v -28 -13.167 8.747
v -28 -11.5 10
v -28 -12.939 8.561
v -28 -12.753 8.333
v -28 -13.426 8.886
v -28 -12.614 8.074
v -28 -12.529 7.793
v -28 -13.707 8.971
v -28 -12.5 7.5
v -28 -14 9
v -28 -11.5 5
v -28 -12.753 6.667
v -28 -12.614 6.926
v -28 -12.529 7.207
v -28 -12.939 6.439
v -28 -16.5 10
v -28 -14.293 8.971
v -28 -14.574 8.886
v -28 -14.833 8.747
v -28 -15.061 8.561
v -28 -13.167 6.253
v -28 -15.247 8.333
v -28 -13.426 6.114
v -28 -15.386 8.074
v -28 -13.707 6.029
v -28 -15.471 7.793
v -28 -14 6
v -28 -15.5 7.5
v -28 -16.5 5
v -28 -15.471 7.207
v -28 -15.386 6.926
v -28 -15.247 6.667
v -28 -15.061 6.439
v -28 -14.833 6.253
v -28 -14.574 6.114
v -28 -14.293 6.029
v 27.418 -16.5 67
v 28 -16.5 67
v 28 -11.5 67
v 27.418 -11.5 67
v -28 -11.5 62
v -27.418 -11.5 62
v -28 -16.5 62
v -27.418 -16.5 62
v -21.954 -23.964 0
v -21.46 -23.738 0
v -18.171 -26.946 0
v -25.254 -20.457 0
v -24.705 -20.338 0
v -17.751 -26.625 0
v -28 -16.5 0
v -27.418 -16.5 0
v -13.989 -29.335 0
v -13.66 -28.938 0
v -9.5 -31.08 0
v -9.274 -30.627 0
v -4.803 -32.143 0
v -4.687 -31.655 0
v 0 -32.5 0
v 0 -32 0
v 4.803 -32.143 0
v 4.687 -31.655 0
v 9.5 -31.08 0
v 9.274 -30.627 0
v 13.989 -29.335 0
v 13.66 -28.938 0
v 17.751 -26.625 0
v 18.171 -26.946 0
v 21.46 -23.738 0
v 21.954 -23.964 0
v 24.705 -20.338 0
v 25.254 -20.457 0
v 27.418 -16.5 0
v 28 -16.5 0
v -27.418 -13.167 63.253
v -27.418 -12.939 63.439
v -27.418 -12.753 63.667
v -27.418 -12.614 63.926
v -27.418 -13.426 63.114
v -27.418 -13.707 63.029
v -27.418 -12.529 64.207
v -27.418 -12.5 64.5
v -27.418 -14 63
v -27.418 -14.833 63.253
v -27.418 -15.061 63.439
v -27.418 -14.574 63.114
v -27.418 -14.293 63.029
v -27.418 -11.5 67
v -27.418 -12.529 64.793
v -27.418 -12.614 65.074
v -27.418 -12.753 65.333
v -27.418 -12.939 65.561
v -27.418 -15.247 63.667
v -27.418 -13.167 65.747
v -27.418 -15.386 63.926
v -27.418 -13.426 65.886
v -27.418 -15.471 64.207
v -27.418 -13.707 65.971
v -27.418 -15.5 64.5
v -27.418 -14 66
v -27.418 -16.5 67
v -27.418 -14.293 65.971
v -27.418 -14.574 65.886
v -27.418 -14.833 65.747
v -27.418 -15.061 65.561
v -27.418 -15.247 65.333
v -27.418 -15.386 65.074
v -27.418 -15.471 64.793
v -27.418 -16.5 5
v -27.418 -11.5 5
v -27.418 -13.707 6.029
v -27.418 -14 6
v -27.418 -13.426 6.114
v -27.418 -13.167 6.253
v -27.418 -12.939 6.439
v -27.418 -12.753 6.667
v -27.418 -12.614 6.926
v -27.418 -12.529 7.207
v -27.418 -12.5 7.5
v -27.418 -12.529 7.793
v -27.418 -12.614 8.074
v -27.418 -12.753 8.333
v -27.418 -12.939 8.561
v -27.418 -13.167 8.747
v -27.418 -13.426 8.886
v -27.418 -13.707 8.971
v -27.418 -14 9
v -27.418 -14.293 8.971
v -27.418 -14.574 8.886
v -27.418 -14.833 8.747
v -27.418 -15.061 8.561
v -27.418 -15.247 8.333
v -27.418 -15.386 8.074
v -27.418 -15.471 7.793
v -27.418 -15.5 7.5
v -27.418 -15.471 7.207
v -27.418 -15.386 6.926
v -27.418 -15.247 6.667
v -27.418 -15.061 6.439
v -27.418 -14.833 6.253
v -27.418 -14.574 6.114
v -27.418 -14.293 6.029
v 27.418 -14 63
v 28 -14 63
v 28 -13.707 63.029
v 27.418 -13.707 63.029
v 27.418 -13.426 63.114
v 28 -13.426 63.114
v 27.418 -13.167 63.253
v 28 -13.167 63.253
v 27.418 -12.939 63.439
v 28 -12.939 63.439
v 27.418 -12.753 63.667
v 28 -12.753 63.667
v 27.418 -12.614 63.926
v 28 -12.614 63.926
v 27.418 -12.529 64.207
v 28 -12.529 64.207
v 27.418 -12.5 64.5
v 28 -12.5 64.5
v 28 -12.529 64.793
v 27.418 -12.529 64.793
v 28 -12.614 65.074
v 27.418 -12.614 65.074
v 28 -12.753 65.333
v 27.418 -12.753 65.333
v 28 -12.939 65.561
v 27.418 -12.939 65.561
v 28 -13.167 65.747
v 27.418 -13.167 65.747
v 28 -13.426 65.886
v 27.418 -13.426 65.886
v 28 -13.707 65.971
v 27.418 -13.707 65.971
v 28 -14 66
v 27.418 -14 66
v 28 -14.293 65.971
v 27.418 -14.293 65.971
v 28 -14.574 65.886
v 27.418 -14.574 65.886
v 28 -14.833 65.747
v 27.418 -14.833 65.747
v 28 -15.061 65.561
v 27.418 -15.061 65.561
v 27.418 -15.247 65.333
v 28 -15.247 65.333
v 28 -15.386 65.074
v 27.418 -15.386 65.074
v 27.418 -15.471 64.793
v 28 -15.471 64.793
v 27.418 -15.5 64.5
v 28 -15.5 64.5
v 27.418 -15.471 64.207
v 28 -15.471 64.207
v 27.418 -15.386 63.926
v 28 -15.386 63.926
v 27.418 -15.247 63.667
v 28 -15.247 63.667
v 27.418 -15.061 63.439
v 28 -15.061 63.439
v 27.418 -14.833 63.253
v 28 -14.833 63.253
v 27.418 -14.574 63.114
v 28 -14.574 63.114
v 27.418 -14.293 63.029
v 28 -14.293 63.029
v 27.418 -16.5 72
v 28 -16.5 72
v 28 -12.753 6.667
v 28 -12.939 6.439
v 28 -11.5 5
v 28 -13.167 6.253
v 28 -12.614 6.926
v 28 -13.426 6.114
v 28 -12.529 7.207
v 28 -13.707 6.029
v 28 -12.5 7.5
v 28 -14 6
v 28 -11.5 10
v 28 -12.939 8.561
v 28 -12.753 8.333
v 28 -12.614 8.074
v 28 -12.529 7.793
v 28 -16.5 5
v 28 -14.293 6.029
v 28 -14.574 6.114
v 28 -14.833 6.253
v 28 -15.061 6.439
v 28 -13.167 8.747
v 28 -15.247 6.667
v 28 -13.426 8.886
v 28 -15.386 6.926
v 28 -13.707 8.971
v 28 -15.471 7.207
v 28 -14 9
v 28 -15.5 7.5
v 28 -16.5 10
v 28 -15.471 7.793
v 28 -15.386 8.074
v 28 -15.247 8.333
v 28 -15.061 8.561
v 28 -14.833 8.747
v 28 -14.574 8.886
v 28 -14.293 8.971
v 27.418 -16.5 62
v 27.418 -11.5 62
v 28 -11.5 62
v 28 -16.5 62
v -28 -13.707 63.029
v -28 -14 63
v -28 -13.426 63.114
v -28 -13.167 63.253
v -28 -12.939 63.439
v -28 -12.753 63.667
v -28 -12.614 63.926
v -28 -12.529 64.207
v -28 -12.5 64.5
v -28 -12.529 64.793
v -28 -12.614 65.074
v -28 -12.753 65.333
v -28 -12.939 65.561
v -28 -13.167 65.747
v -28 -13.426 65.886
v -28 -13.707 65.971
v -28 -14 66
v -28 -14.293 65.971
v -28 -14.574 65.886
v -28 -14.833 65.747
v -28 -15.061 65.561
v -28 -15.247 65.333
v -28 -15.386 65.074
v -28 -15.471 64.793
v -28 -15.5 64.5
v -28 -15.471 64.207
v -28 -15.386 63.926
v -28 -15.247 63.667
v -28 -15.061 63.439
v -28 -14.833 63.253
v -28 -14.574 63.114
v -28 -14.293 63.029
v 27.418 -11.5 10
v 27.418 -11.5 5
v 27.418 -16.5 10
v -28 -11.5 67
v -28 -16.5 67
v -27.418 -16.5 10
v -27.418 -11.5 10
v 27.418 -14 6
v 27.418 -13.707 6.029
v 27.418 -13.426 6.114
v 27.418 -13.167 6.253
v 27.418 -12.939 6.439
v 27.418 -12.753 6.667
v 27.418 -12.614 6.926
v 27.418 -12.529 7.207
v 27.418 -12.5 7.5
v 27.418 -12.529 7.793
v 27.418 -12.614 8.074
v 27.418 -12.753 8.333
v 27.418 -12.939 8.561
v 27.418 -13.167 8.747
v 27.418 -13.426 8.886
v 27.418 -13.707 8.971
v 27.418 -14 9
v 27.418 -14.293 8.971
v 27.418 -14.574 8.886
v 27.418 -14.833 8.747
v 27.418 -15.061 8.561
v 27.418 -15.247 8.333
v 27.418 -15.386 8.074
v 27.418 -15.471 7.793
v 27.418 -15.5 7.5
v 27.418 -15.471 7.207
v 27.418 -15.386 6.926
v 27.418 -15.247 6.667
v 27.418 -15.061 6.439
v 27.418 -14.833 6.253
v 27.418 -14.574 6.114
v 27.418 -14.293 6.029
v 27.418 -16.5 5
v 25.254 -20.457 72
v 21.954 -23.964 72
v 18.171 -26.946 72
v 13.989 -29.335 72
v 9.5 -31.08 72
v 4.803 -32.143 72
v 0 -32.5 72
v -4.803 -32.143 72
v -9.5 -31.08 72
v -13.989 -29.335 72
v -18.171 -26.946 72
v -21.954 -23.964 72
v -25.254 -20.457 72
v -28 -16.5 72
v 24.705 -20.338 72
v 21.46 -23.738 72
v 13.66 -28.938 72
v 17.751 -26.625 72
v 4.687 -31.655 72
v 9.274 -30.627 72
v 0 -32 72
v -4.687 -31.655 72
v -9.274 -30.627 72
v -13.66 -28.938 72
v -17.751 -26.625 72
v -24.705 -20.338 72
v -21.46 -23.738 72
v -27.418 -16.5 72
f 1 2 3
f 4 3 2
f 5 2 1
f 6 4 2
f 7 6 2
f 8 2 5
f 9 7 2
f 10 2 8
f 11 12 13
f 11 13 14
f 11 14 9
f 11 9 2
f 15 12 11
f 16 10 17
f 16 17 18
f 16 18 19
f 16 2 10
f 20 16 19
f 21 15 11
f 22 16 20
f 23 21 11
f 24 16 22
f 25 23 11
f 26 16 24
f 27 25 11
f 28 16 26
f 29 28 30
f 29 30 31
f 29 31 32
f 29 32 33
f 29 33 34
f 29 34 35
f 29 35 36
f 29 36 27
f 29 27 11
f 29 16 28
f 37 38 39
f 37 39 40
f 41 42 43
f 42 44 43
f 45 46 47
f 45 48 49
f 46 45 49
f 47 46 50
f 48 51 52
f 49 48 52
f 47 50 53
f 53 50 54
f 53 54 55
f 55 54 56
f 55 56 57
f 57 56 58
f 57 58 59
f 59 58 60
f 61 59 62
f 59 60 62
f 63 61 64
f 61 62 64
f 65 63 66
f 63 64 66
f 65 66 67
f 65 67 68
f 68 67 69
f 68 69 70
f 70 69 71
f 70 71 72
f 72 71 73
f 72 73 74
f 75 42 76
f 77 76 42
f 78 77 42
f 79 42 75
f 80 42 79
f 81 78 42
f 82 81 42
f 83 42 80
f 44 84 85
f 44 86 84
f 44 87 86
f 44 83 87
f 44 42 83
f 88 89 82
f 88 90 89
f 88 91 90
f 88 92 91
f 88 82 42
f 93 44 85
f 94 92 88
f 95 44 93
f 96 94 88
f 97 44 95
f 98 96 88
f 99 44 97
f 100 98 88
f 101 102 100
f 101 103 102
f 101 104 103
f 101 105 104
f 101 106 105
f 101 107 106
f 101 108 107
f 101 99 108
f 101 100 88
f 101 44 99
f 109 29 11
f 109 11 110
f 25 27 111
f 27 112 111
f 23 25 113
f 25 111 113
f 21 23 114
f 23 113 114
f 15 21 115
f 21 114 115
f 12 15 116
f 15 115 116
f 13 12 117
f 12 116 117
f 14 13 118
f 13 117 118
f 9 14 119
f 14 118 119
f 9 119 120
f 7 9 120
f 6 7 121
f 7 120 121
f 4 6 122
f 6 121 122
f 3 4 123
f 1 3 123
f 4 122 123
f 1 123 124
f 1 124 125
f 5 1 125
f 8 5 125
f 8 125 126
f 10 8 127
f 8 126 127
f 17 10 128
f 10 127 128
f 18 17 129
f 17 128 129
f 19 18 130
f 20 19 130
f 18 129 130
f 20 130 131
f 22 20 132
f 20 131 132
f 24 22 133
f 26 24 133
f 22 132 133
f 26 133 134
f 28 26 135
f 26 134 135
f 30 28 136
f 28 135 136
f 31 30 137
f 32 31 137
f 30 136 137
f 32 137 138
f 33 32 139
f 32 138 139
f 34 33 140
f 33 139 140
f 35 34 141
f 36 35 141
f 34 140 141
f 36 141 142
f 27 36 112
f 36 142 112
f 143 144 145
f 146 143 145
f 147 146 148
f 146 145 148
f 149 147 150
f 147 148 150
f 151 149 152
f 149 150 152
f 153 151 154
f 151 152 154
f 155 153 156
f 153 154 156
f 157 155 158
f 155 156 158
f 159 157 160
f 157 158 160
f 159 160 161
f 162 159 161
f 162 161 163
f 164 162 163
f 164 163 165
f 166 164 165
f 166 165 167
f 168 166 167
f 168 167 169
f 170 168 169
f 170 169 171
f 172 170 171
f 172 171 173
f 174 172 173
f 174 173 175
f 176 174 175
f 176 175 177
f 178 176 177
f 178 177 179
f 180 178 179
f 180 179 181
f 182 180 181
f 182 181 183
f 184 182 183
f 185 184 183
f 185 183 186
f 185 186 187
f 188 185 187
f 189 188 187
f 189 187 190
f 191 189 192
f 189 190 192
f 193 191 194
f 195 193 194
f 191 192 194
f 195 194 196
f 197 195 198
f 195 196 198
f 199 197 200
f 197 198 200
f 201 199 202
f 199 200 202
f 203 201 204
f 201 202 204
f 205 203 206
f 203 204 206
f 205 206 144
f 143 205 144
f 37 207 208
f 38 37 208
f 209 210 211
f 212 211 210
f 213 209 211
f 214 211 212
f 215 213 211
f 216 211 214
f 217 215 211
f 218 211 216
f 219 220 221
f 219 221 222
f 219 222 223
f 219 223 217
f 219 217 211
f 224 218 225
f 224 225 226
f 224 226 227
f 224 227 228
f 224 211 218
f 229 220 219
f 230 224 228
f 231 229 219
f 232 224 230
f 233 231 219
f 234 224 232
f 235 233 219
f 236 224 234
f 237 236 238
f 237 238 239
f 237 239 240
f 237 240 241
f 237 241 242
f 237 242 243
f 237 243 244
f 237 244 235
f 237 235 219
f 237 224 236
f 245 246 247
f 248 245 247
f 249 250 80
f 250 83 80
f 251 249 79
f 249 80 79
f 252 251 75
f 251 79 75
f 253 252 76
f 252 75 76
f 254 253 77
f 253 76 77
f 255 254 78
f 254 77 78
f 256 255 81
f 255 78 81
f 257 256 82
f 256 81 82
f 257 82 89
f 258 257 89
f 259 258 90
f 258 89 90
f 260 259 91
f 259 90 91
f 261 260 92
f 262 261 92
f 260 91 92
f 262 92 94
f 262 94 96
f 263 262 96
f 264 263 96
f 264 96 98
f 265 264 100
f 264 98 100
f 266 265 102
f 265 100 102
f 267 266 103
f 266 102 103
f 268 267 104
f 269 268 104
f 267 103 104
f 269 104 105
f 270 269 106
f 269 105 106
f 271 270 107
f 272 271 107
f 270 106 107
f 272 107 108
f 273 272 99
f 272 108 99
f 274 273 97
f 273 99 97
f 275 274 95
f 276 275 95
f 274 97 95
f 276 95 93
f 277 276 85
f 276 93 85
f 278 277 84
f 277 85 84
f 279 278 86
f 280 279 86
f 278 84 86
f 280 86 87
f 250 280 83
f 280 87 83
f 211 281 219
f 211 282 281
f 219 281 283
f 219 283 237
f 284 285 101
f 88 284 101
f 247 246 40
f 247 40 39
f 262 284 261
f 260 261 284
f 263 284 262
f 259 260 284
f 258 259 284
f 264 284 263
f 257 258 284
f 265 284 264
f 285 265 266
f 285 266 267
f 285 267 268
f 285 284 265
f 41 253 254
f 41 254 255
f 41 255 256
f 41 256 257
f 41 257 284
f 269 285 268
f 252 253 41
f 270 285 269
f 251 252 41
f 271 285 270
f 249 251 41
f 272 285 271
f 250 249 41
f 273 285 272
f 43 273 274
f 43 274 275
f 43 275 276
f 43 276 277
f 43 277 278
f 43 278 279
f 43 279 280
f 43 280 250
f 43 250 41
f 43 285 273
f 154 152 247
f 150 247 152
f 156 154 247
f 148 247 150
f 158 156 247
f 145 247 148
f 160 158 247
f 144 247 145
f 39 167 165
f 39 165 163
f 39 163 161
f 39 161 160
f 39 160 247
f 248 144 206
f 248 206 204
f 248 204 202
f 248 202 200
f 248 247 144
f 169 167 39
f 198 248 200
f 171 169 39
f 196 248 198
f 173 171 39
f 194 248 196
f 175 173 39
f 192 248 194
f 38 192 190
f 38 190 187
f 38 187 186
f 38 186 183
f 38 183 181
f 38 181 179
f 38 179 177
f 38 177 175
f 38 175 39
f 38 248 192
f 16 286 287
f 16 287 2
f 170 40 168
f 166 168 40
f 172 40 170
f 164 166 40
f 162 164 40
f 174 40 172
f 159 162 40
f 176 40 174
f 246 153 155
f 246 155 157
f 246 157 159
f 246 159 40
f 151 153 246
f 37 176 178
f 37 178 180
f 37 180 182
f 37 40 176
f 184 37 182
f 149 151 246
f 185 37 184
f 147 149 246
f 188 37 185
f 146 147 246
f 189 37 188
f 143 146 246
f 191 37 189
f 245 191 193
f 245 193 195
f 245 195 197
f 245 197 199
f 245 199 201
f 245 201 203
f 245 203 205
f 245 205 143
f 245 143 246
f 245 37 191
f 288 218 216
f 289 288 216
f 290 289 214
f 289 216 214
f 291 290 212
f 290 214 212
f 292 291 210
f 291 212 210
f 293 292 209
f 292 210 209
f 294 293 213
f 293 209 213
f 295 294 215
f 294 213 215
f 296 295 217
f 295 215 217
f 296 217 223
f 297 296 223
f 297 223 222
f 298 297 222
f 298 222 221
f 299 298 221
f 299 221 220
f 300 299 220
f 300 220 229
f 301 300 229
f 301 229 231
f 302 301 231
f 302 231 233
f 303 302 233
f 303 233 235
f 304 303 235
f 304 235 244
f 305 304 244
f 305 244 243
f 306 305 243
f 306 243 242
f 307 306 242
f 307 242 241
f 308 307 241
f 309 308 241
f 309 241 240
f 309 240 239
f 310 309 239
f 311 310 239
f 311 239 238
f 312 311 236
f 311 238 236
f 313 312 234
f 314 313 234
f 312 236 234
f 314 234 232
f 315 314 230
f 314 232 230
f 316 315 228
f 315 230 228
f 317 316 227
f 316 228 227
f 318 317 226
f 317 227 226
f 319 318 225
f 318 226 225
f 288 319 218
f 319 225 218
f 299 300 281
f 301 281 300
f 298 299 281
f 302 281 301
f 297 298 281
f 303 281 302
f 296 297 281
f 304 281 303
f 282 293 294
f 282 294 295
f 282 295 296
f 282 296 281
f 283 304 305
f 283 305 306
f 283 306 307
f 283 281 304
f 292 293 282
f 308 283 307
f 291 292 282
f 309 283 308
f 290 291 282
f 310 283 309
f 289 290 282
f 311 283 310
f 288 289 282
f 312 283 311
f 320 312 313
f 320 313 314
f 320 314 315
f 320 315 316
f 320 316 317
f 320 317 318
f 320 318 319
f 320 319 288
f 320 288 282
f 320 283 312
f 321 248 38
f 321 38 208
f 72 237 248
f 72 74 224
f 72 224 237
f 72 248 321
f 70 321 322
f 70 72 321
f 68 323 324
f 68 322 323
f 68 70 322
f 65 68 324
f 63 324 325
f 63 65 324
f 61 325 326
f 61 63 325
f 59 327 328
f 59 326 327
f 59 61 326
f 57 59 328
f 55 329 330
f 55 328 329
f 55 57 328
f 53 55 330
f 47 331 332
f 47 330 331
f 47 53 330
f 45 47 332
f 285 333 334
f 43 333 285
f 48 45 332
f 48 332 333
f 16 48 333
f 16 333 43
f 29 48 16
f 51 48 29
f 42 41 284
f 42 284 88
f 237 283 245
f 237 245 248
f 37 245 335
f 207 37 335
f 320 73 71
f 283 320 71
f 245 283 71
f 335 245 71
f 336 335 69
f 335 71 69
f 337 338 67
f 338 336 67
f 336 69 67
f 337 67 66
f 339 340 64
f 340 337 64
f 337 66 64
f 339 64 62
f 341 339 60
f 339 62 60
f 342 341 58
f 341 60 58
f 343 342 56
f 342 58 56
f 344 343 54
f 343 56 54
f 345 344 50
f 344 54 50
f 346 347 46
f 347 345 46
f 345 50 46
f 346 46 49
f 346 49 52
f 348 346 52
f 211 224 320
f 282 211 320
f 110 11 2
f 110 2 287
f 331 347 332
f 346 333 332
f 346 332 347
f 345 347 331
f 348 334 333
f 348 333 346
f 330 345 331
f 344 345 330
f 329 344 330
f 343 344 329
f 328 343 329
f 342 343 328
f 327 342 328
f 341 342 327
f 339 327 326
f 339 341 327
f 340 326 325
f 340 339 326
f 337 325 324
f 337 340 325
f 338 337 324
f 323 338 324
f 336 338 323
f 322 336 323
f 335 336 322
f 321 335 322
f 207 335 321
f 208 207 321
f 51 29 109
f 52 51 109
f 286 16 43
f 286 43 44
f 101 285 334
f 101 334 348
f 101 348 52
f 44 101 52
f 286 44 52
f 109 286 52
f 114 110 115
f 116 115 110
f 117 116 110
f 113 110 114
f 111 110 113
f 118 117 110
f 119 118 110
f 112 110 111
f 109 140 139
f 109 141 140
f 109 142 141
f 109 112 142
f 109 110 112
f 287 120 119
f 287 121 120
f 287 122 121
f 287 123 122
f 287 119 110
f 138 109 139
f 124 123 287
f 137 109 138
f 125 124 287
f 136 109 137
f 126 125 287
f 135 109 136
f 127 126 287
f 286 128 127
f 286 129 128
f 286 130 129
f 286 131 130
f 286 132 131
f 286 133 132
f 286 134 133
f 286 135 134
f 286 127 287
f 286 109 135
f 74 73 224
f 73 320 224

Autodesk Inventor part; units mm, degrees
ref_plane "YZ Plane" through (0, 0, 0) normal (1, 0, 0) x (0, 1, 0)
ref_plane "XZ Plane" through (0, 0, 0) normal (0, 1, 0) x (-1, 0, 0)
ref_plane "XY Plane" through (0, 0, 0) normal (0, 0, 1) x (1, 0, 0)
sketch "Szkic1" plane through (0, 0, 0) normal (0, 0, 1) x (1, 0, 0)
  circle A0 centre (0, 0) radius 32.5
  circle A1 centre (0, 0) radius 32
  dimension "d0" = 65
  dimension "d1" = 64
extrude "Wyciągnięcie proste1" add sketch "Szkic1" along normal blind 72
sketch "Szkic2" plane through (0, 0, 72) normal (0, 0, 1) x (1, 0, 0)
  line L0 (0, 0) -> (-28, 0)
  line L1 (-28, 0) -> (-28, 15.4919)
  circle A0 centre (0, 0) radius 32 projected
  line L2 (-28, 0) -> (-28, -16.5)
  circle A1 centre (0, 0) radius 32.5 projected
  line L3 (-28, -16.5) -> (28, -16.5)
  line L4 (52.8927, -0.6882) -> (26.703, 44.9724)
  line L5 (26.703, 44.9724) -> (-31.7097, 42.3671)
  line L6 (-31.7097, 42.3671) -> (-48.5067, -13.9887)
  line L7 (-48.5067, -13.9887) -> (-28, -16.5)
  line L8 (28, -16.5) -> (52.8927, -0.6882)
  dimension "d4" = 28
extrude "Wyciągnięcie proste2" cut sketch "Szkic2" against normal blind 77 contours L2 A0 L1 | L1 A0 L3 L2 | A0 L2 A1 L3 | A0 L3 L2 | L7 L6 L5 L4 L8 A1
sketch "Szkic3" plane through (-27.4181, -16.5, 72) normal (0, 1, 0) x (1, 0, 0)
  line L0 (-0.5819, 0) -> (55.4181, 0) projected
  line L1 (-0.5819, 0) -> (-0.5819, 5)
  line L2 (-0.5819, 0) -> (-0.5819, 72) projected
  line L3 (-0.5819, 5) -> (0, 5)
  line L4 (0, 72) -> (0, 0) projected
  line L5 (0, 5) -> (0, 10)
  line L6 (0, 10) -> (-0.5819, 10)
  line L7 (-0.5819, 10) -> (-0.5819, 5)
  line L8 (-0.5819, 72) -> (55.4181, 72) projected
  line L9 (-0.5819, 72) -> (-0.5819, 67)
  line L10 (-0.5819, 67) -> (0, 67)
  line L11 (0, 67) -> (0, 62)
  line L12 (0, 62) -> (-0.5819, 62)
  line L13 (-0.5819, 62) -> (-0.5819, 67)
  line L14 (55.4181, 72) -> (55.4181, 67)
  line L15 (55.4181, 72) -> (55.4181, 0) projected
  line L16 (55.4181, 67) -> (54.8361, 67)
  line L17 (54.8361, 0) -> (54.8361, 72) projected
  line L18 (54.8361, 67) -> (54.8361, 62)
  line L19 (54.8361, 62) -> (55.4181, 62)
  line L20 (55.4181, 62) -> (55.4181, 67)
  line L21 (55.4181, 0) -> (55.4181, 5)
  line L22 (55.4181, 5) -> (54.8361, 5)
  line L23 (54.8361, 5) -> (54.8361, 10)
  line L24 (54.8361, 10) -> (55.4181, 10)
  line L25 (55.4181, 10) -> (55.4181, 5)
  point P0 (27.4181, 72)
  point P1 (-0.5819, 62)
  point P2 (0, 62)
  point P3 (0, 67)
  point P4 (-0.5819, 67)
  dimension "d7" = 5
  dimension "d8" = 5
  dimension "d9" = 5
  dimension "d10" = 5
  dimension "d11" = 5
  dimension "d12" = 5
  dimension "d13" = 5
  dimension "d14" = 5
extrude "Wyciągnięcie proste3" add sketch "Szkic3" along normal blind 5 contours L2 L6 L4 L3 | L17 L24 L15 L22 | L2 L10 L4 L12 | L17 L16 L15 L19
sketch "Szkic4" plane through (28, -16.5, 62) normal (1, 0, 0) x (0, 0, -1)
  line L0 (52, 0) -> (52, 5) projected
  line L1 (57, 0) -> (57, 5) projected
  line L2 (52, 0) -> (57, 5)
  line L3 (57, 5) -> (52, 5) projected
  line L4 (57, 5) -> (52, 5)
  line L5 (52, 5) -> (57, 0)
  line L6 (0, 0) -> (-5, 0) projected
  line L7 (-5, 5) -> (0, 5) projected
  line L8 (-5, 0) -> (0, 5)
  line L9 (0, 5) -> (-5, 5)
  line L10 (-5, 5) -> (0, 0)
  circle A0 centre (-2.5, 2.5) radius 1.5
  circle A1 centre (54.5, 2.5) radius 1.5
  point P0 (62, 16.5)
  dimension "d17" = 3
  dimension "d18" = 3
extrude "Wyciągnięcie proste4" cut sketch "Szkic4" against normal up to surface (56 mm away) contours A1 L5 L2 | L2 L5 A1 | A1 L2 L5 | L2 A1 L5 | A0 L8 L10 | L10 L8 A0 | A0 L10 L8 | L10 A0 L8
properties part number "Obudowa, mniejsza"
